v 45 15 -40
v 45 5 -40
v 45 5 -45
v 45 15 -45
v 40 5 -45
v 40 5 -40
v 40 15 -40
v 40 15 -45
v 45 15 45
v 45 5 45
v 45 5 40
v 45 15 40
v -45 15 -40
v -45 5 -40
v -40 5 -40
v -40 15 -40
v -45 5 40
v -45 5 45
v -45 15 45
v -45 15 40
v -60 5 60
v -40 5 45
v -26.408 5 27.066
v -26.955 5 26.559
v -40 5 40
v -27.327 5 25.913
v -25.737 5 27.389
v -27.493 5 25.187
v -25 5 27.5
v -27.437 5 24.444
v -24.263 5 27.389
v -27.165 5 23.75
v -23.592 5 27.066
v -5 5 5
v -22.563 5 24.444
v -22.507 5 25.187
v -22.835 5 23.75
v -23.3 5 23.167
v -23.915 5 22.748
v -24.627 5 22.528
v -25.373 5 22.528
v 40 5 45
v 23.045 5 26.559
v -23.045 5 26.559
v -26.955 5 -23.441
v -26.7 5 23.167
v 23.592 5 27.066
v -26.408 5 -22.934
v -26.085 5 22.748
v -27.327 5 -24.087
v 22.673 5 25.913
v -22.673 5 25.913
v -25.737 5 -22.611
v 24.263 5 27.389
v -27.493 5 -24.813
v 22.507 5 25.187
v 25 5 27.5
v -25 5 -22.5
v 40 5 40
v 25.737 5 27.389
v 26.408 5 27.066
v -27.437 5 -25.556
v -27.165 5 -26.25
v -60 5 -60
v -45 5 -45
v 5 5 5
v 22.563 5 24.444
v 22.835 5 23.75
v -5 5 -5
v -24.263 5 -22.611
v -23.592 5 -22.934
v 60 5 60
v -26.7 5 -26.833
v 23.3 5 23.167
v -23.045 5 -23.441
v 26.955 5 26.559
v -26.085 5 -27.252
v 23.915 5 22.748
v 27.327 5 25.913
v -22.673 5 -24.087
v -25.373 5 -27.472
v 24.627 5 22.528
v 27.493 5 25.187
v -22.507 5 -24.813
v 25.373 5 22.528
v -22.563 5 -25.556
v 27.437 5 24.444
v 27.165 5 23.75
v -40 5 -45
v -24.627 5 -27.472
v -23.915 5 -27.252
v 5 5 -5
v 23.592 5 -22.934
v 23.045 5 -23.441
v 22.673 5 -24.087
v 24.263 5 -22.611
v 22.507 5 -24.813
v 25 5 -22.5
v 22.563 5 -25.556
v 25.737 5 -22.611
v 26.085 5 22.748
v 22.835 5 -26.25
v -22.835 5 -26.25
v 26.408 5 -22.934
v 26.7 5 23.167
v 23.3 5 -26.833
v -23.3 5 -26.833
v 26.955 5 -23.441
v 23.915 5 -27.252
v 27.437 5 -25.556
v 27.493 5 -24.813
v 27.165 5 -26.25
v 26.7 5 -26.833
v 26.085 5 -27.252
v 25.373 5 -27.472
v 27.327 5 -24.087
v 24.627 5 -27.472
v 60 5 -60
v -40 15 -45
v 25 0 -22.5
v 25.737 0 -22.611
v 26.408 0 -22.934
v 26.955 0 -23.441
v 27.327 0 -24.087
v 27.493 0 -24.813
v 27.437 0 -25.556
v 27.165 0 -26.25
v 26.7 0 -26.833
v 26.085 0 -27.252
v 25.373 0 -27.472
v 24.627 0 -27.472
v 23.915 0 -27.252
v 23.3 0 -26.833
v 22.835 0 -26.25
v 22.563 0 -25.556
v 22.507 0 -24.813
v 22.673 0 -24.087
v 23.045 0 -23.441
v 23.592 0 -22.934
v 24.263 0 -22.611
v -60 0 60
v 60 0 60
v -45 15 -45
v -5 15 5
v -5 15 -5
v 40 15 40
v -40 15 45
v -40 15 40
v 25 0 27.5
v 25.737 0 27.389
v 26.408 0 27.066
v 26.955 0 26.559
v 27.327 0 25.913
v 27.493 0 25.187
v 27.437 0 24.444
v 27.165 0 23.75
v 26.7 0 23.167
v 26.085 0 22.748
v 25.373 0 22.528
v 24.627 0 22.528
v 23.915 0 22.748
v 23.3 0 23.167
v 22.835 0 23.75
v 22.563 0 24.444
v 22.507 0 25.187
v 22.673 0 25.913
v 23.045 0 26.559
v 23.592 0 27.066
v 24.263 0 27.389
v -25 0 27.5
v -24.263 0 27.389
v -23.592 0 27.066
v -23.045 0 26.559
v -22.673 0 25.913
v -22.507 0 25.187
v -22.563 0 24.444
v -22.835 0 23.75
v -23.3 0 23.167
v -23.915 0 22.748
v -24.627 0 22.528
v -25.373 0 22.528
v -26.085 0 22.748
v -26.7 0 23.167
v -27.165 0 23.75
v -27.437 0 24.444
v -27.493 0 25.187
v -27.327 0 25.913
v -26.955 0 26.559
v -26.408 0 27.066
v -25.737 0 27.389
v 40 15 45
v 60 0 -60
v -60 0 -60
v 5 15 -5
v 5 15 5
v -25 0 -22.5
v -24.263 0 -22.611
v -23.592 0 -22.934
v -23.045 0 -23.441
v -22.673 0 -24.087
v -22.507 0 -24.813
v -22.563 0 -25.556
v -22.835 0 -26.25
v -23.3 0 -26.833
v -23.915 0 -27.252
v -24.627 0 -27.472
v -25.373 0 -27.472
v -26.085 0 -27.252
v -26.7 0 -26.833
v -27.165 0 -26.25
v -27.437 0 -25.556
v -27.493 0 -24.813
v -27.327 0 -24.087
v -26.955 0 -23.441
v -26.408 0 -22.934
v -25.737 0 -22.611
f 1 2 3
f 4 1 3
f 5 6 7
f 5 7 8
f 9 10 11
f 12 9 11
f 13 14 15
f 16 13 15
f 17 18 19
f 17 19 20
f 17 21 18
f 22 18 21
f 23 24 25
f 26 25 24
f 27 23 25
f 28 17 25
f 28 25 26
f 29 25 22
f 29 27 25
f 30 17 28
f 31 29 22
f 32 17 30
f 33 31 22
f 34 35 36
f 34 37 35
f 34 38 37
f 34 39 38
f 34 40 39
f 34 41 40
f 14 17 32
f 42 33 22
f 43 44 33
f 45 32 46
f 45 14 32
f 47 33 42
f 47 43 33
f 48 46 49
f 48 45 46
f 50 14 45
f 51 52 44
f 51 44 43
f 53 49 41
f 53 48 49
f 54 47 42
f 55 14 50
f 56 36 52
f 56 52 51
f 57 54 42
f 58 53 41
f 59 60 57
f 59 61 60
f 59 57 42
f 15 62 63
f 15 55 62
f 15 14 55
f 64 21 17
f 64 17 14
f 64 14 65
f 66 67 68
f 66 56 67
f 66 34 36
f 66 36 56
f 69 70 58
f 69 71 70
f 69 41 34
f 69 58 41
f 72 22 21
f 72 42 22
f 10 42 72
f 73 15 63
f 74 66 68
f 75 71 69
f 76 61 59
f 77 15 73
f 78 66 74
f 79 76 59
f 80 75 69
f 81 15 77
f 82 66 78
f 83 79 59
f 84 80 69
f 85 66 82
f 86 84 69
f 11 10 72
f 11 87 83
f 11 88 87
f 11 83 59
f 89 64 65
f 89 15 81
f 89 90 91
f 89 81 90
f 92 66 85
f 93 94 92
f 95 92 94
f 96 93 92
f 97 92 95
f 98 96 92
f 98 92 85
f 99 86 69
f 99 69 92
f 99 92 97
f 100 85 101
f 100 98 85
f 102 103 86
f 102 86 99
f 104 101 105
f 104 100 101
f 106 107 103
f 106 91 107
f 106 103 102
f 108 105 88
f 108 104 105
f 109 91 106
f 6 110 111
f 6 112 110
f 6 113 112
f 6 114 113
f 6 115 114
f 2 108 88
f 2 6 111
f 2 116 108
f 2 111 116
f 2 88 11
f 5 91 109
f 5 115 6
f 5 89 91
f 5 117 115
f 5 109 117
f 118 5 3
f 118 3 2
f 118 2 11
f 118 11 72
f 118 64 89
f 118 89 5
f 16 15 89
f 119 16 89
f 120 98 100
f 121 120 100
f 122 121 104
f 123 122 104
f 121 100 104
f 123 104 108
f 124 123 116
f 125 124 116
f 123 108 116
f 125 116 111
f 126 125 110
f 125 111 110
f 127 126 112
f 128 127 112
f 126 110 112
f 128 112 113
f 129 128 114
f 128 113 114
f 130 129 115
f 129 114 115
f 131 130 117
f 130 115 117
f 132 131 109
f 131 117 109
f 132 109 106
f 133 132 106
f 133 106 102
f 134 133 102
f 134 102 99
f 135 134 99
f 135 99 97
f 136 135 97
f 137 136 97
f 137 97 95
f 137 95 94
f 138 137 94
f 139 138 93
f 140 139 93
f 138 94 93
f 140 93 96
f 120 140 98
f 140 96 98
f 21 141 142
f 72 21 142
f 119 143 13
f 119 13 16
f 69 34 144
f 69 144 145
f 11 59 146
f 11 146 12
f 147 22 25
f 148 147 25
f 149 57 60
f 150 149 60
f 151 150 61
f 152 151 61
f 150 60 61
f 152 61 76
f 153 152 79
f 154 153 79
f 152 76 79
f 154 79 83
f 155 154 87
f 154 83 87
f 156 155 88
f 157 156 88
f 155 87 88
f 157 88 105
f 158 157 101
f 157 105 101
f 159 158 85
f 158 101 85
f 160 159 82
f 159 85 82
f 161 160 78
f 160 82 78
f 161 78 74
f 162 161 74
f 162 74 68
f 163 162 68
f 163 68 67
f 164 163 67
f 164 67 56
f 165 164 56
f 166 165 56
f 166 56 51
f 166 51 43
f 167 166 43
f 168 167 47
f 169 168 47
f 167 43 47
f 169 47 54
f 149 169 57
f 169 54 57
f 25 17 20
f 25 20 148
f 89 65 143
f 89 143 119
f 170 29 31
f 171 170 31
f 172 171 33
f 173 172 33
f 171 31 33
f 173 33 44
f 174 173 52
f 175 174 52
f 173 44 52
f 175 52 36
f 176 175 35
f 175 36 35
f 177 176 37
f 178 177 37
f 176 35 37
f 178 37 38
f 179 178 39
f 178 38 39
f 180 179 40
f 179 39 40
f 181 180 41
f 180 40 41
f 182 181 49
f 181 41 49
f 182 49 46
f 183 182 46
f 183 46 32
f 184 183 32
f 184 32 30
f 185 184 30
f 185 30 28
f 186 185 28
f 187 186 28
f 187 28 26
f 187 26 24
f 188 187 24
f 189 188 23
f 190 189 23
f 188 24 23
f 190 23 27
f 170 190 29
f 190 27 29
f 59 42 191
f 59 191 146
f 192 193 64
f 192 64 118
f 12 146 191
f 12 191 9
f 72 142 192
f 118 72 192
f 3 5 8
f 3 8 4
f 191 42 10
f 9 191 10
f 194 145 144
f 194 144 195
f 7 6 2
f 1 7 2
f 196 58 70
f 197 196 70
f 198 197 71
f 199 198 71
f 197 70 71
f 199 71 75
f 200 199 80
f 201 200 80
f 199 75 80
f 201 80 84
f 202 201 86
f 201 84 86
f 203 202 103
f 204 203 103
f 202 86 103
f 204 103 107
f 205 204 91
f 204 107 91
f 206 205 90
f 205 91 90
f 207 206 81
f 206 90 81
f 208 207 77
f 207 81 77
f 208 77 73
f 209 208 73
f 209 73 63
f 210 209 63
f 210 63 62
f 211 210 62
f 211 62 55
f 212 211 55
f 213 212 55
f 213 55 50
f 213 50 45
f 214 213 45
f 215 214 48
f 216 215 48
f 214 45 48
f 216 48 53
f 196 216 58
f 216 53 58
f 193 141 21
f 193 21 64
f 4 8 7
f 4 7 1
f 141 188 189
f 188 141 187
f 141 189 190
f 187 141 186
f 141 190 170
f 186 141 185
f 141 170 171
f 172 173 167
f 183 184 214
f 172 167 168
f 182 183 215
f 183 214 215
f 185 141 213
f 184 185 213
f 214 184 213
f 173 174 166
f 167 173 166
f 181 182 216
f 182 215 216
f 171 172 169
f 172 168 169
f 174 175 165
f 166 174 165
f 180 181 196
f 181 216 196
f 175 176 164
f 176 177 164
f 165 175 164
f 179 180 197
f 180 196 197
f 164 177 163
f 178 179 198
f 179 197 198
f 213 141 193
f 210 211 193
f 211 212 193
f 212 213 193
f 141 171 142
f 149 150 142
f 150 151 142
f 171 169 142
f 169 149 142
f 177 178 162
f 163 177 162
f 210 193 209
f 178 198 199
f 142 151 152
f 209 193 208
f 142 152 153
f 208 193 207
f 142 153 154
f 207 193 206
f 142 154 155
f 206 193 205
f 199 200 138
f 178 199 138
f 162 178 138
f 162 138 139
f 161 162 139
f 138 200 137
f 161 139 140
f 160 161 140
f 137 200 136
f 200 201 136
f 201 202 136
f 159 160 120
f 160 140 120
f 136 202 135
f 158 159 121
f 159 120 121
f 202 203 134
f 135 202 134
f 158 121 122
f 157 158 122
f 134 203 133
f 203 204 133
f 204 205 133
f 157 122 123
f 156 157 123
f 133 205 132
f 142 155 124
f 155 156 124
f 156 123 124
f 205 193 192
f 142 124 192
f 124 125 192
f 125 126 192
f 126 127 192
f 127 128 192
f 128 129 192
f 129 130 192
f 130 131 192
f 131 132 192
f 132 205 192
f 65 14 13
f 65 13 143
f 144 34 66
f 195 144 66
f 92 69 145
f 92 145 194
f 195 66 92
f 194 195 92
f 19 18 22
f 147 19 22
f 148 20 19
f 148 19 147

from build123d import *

# Parameters (mm, degrees)
SKETCH1_W           = 120
SKETCH1_H           = 120
BOSS_EXTRUDE1_DEPTH = 5
SKETCH2_R           = 2.5
CUT_EXTRUDE1_DEPTH  = 5
SKETCH3_R           = 2.5
CUT_EXTRUDE2_DEPTH  = 5
SKETCH4_R           = 2.5
CUT_EXTRUDE3_DEPTH  = 5
SKETCH5_R           = 2.5
CUT_EXTRUDE4_DEPTH  = 5
SKETCH6_W           = 10
SKETCH6_H           = 10
BOSS_EXTRUDE2_DEPTH = 10
SKETCH10_W          = 5
SKETCH10_H          = 5
BOSS_EXTRUDE4_DEPTH = 10
SKETCH11_W          = 5
SKETCH11_H          = 5
BOSS_EXTRUDE5_DEPTH = 10
SKETCH12_W          = 5
SKETCH12_H          = 5
BOSS_EXTRUDE6_DEPTH = 10
SKETCH13_W          = 5
SKETCH13_H          = 5
BOSS_EXTRUDE7_DEPTH = 10


with BuildPart() as part:
    # Sketch1 → Boss-Extrude1 (new body)
    with BuildSketch(Plane(origin=(0, 0, 0), x_dir=(1, 0, 0), z_dir=(0, 1, 0))):
        Rectangle(SKETCH1_W, SKETCH1_H)
    extrude(amount=BOSS_EXTRUDE1_DEPTH)

    # Sketch2 → Cut-Extrude1 (cut)
    with BuildSketch(Plane(origin=(0, 5, 0), x_dir=(1, 0, 0), z_dir=(0, 1, 0))):
        with Locations(Location((-25, 25, 0), (0, 0, 270))):
            Circle(SKETCH2_R)
    extrude(amount=-CUT_EXTRUDE1_DEPTH, mode=Mode.SUBTRACT)

    # Sketch3 → Cut-Extrude2 (cut)
    with BuildSketch(Plane(origin=(0, 5, 0), x_dir=(1, 0, 0), z_dir=(0, 1, 0))):
        with Locations(Location((25, 25, 0), (0, 0, 270))):
            Circle(SKETCH3_R)
    extrude(amount=-CUT_EXTRUDE2_DEPTH, mode=Mode.SUBTRACT)

    # Sketch4 → Cut-Extrude3 (cut)
    with BuildSketch(Plane(origin=(0, 5, 0), x_dir=(1, 0, 0), z_dir=(0, 1, 0))):
        with Locations(Location((25, -25, 0), (0, 0, 270))):
            Circle(SKETCH4_R)
    extrude(amount=-CUT_EXTRUDE3_DEPTH, mode=Mode.SUBTRACT)

    # Sketch5 → Cut-Extrude4 (cut)
    with BuildSketch(Plane(origin=(0, 5, 0), x_dir=(1, 0, 0), z_dir=(0, 1, 0))):
        with Locations(Location((-25, -25, 0), (0, 0, 270))):
            Circle(SKETCH5_R)
    extrude(amount=-CUT_EXTRUDE4_DEPTH, mode=Mode.SUBTRACT)

    # Sketch6 → Boss-Extrude2 (add)
    with BuildSketch(Plane(origin=(0, 5, 0), x_dir=(1, 0, 0), z_dir=(0, 1, 0))):
        Rectangle(SKETCH6_W, SKETCH6_H)
    extrude(amount=BOSS_EXTRUDE2_DEPTH)

    # Sketch10 → Boss-Extrude4 (add)
    with BuildSketch(Plane(origin=(0, 5, 0), x_dir=(1, 0, 0), z_dir=(0, 1, 0))):
        with Locations((42.5, 42.5)):
            Rectangle(SKETCH10_W, SKETCH10_H)
    extrude(amount=BOSS_EXTRUDE4_DEPTH)

    # Sketch11 → Boss-Extrude5 (add)
    with BuildSketch(Plane(origin=(0, 5, 0), x_dir=(1, 0, 0), z_dir=(0, 1, 0))):
        with Locations((-42.5, 42.5)):
            Rectangle(SKETCH11_W, SKETCH11_H)
    extrude(amount=BOSS_EXTRUDE5_DEPTH)

    # Sketch12 → Boss-Extrude6 (add)
    with BuildSketch(Plane(origin=(0, 5, 0), x_dir=(1, 0, 0), z_dir=(0, 1, 0))):
        with Locations((42.5, -42.5)):
            Rectangle(SKETCH12_W, SKETCH12_H)
    extrude(amount=BOSS_EXTRUDE6_DEPTH)

    # Sketch13 → Boss-Extrude7 (add)
    with BuildSketch(Plane(origin=(0, 5, 0), x_dir=(1, 0, 0), z_dir=(0, 1, 0))):
        with Locations((-42.5, -42.5)):
            Rectangle(SKETCH13_W, SKETCH13_H)
    extrude(amount=BOSS_EXTRUDE7_DEPTH)


solid = part.part
